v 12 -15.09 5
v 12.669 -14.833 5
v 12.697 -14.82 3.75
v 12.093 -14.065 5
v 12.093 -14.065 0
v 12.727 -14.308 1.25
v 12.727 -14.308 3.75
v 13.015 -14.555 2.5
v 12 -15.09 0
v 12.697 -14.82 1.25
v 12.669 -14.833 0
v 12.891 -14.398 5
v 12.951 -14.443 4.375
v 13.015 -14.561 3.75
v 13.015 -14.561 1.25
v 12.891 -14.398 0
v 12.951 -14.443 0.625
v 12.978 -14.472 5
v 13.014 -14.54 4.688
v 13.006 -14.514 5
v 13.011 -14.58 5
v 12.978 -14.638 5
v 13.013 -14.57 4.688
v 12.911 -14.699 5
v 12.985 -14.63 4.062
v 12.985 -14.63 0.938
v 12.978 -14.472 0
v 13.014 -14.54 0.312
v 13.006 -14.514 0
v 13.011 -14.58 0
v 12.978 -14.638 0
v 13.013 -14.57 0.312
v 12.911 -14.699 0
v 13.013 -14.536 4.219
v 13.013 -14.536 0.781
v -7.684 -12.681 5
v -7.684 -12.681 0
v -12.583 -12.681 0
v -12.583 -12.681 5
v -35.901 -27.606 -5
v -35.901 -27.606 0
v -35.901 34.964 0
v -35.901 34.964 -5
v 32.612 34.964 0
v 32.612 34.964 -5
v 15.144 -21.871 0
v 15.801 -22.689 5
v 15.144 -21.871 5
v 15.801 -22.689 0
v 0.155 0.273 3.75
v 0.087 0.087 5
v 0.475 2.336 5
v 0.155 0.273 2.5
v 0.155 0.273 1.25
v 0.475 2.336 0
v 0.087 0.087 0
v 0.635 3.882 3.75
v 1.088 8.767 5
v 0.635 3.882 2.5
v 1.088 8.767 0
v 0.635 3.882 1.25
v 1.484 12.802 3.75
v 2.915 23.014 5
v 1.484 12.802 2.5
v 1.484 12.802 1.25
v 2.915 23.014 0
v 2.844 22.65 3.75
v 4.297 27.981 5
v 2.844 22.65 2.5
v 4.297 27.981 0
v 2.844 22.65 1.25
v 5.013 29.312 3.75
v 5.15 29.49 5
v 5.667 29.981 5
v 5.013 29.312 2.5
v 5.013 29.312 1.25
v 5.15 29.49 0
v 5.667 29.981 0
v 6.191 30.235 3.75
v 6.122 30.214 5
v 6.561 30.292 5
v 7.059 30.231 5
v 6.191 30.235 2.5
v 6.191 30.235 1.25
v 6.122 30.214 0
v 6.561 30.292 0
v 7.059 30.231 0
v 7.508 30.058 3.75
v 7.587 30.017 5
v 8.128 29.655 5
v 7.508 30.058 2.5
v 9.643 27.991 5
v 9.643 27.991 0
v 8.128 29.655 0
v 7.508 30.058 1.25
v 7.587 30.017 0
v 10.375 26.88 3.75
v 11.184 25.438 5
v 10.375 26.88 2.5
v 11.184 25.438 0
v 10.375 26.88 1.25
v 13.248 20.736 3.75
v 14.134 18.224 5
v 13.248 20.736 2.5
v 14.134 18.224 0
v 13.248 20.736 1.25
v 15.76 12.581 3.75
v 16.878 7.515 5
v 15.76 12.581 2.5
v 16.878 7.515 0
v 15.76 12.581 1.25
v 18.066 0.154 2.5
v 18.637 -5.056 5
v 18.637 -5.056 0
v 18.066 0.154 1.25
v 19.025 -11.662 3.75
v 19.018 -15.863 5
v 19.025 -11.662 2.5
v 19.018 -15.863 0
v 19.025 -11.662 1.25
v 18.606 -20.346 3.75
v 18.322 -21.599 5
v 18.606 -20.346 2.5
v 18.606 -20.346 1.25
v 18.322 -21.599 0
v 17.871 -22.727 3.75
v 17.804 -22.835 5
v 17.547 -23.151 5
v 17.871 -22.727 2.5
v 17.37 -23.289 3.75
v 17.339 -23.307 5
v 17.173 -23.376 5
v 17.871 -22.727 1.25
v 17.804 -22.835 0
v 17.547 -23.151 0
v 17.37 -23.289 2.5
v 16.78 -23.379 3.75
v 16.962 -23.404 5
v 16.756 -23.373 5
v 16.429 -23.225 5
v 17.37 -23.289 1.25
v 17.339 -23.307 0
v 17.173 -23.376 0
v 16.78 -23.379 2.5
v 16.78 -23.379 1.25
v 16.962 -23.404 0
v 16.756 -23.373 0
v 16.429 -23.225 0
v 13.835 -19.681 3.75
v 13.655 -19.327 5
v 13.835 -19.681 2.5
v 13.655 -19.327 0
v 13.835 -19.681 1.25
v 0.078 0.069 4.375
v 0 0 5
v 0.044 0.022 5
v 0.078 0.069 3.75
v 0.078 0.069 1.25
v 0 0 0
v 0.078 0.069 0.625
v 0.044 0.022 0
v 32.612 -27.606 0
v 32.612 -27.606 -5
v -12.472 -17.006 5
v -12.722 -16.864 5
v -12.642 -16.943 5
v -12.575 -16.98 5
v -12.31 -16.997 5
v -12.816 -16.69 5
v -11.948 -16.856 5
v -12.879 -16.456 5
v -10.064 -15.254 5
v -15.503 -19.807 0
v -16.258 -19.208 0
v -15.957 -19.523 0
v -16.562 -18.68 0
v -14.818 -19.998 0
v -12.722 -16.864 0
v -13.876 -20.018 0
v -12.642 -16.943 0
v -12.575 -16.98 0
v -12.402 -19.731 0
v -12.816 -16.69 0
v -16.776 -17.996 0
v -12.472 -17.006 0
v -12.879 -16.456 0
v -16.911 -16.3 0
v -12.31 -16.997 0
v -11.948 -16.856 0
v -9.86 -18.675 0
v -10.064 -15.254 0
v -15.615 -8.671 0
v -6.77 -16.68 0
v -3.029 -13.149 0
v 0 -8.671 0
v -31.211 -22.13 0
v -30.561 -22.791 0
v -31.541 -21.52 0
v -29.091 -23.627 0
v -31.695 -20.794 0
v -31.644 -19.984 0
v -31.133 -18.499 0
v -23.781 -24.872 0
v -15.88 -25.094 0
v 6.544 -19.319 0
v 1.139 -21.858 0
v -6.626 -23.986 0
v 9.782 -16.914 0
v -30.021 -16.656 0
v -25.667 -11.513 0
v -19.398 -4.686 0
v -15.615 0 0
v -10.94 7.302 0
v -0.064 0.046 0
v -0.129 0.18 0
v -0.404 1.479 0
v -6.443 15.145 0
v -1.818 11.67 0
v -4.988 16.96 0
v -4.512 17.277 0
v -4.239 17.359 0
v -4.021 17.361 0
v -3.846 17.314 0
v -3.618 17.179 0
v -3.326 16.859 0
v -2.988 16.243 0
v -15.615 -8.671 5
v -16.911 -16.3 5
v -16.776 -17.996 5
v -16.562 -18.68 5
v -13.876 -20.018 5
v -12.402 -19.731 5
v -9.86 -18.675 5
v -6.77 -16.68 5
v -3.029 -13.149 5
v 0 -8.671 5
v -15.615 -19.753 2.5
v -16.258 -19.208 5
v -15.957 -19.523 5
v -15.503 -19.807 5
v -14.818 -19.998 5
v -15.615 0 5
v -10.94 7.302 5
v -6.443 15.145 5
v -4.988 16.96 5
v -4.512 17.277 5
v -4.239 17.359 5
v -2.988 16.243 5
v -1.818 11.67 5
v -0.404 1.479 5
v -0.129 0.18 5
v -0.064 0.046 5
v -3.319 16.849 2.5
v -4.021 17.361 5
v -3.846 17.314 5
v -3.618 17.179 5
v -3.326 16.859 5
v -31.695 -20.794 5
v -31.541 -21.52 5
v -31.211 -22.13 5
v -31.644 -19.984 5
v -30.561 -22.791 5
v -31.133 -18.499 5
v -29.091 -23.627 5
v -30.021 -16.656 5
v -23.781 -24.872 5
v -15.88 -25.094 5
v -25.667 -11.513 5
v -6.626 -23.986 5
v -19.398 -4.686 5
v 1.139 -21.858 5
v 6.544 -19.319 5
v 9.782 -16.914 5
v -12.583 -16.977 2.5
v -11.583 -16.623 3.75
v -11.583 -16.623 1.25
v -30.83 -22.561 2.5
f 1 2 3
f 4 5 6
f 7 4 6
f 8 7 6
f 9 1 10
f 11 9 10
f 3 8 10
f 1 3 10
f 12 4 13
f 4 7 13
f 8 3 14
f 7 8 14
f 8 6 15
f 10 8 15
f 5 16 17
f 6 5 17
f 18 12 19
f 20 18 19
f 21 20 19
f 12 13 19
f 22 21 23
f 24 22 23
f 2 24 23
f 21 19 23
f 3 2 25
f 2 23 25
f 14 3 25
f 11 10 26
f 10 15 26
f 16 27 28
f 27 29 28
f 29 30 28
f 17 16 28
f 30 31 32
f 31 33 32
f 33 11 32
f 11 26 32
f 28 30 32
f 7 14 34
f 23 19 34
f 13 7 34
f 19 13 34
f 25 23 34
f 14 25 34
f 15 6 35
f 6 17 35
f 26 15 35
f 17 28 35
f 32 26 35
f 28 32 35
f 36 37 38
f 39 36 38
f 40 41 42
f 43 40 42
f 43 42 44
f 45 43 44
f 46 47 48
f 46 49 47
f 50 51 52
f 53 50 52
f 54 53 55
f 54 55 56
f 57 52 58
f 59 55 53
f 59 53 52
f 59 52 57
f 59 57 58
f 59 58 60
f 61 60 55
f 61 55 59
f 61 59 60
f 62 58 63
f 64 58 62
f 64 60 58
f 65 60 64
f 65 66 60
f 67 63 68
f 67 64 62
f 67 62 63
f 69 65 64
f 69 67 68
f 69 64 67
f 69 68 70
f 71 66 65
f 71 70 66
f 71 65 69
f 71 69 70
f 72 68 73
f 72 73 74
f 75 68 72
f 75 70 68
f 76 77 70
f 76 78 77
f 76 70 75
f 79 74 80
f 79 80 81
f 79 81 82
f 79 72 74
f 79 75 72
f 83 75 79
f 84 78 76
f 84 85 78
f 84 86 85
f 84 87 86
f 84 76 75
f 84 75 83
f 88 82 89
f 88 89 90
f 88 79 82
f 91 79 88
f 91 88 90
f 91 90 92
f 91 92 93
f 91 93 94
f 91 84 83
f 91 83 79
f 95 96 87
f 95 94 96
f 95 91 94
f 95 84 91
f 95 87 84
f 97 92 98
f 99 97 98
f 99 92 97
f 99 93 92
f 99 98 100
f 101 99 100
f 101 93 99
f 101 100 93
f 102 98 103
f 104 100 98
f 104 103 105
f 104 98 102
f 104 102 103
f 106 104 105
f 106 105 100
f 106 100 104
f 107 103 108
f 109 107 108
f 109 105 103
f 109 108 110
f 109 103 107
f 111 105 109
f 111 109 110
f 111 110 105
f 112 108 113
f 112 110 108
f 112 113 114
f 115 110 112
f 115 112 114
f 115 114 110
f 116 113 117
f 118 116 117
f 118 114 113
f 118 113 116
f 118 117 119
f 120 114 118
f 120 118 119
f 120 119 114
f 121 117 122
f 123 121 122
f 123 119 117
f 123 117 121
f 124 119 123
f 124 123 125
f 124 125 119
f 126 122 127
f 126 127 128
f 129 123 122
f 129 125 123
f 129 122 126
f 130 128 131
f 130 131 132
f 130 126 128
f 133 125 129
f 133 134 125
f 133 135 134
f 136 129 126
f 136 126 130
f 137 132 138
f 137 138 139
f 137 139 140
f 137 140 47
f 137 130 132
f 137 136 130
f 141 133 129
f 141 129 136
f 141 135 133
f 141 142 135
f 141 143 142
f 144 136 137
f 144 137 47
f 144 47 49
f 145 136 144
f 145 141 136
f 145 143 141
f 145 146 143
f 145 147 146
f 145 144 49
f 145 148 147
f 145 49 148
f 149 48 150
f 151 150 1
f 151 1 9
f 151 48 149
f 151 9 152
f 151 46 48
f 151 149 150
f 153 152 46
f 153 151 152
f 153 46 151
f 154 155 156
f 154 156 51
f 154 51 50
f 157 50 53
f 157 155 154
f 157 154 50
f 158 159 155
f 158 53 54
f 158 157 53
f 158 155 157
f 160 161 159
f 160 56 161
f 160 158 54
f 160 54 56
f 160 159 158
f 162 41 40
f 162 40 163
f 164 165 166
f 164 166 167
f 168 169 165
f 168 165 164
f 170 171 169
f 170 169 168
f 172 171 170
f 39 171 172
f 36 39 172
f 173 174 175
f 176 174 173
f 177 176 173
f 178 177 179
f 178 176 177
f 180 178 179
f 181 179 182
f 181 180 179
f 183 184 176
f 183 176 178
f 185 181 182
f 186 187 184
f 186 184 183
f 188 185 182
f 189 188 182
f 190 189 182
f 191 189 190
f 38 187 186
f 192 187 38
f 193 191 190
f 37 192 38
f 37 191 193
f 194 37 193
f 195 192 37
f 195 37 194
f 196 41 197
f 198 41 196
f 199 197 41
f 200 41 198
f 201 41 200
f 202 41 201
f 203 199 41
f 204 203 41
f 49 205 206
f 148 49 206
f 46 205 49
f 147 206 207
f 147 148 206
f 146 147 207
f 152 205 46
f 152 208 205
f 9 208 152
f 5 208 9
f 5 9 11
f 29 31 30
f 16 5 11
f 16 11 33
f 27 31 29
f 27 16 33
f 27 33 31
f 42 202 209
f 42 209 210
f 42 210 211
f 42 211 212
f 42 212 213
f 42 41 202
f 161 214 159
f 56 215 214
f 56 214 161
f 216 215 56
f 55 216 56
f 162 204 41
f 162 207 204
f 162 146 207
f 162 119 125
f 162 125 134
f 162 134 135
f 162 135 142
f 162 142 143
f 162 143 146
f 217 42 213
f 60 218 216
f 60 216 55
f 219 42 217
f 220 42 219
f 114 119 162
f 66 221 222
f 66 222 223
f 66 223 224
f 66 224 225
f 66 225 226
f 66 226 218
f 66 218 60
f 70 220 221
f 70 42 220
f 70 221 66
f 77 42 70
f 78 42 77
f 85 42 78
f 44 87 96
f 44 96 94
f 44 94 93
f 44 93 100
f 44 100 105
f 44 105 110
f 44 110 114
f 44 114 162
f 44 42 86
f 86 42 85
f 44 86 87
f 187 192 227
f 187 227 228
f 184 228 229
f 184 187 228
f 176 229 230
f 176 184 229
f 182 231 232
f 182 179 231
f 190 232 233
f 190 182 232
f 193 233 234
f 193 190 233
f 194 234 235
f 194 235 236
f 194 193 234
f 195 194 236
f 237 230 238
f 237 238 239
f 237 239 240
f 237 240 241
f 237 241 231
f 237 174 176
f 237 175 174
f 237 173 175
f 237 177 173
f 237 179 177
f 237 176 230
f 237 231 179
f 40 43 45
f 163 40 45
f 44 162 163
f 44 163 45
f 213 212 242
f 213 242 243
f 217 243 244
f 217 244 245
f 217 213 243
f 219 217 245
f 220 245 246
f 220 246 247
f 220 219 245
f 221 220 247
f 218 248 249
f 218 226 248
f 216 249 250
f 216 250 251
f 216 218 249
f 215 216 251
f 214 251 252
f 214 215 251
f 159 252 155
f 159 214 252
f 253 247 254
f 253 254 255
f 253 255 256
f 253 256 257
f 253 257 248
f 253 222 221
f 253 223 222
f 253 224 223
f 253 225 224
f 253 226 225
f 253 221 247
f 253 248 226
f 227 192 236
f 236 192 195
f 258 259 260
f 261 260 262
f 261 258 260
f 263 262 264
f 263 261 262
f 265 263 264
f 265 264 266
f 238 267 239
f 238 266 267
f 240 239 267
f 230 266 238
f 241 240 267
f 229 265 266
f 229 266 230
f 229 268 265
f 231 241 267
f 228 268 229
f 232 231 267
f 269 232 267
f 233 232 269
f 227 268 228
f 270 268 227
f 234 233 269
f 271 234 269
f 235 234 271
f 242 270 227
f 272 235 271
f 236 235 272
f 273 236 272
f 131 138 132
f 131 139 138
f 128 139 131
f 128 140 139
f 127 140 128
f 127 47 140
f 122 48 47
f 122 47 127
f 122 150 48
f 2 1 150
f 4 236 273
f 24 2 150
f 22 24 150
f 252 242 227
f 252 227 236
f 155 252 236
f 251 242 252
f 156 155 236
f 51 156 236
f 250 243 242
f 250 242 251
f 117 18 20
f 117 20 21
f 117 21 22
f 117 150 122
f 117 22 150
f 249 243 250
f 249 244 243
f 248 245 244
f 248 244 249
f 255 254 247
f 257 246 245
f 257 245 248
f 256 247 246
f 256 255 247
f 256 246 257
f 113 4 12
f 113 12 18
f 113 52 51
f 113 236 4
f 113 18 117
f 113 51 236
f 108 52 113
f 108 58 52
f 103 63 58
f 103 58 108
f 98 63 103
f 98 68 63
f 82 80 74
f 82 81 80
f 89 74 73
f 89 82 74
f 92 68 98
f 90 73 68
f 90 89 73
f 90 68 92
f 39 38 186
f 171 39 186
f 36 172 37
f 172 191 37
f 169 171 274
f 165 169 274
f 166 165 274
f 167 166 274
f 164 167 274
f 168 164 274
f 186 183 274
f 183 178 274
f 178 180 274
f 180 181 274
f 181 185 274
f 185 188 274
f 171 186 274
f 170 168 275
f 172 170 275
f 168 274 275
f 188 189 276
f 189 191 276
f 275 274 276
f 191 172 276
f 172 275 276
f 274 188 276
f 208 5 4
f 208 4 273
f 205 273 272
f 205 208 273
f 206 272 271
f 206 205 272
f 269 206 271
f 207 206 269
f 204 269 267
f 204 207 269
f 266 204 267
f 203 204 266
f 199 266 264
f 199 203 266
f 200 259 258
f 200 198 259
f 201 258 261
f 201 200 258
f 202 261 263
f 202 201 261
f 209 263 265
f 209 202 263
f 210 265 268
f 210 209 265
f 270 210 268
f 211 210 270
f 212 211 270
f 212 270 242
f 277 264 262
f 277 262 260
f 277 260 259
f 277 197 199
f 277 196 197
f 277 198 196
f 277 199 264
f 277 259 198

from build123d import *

# Parameters (mm, degrees)
F0_W     = 15.6148327515
F0_H     = 8.6711440235
F1_DEPTH = 5
F3_DEPTH = 5
F4_W     = 68.5134455562
F4_H     = 62.5702701509
F5_DEPTH = 5


with BuildPart() as f1:
    # F0 (on Top) → F1 (new body)
    with BuildSketch(Plane.XY):
        with BuildLine():
            Line((-15.6148327515, 0), (0, 0))
            add(Edge.make_bspline(
                [(-15.6148327515, 0), (-8.9372500336, 9.1029204064), (-2.2477140541, 29.6426476673), (-0.6363883786, 0.0078806838), (0, 0)],
                knots=[0.5007531788, 0.5007531788, 0.5007531788, 0.5007531788, 0.5806839228, 0.6532089623, 0.6532089623, 0.6532089623, 0.6532089623], degree=3))
        make_face()
        with BuildLine():
            Line((-15.6148327515, -8.6711440235), (-15.6148327515, 0))
            add(Edge.make_bspline(
                [(12.0928417891, -14.0651799738), (5.386580395, -25.6612903483), (-49.9212476219, -29.049867362), (-23.2419077071, -10.3972738622), (-15.6148327515, 0)],
                knots=[0.2936885694, 0.2936885694, 0.2936885694, 0.2936885694, 0.4094570015, 0.5007531788, 0.5007531788, 0.5007531788, 0.5007531788], degree=3))
            add(Edge.make_bspline(
                [(0, -8.6711440235), (3.7584985414, -1.2441509088), (1.9211653663, 20.0410270227), (16.9917902231, -5.5941790062), (12.0928417891, -14.0651799738)],
                knots=[0.1348423555, 0.1348423555, 0.1348423555, 0.1348423555, 0.2091193071, 0.2936885694, 0.2936885694, 0.2936885694, 0.2936885694], degree=3))
            add(Edge.make_bspline(
                [(-15.6148327515, -8.6711440235), (-16.7391498892, -13.622858393), (-19.3413703684, -25.0835499715), (-3.8751508711, -16.3286483489), (0, -8.6711440235)],
                knots=[0, 0, 0, 0, 0.0582600739, 0.1348423555, 0.1348423555, 0.1348423555, 0.1348423555], degree=3))
        make_face()
        with BuildLine():
            add(Edge.make_bspline(
                [(0, 0), (0.837458348, -0.0103706237), (1.9500780727, 44.3228880047), (19.3895903674, 12.2973607043), (20.3959204885, -35.025724631), (12.2675216154, -16.7139183871), (11.9997626171, -15.0897074491)],
                knots=[0.6532089623, 0.6532089623, 0.6532089623, 0.6532089623, 0.7486486369, 0.8266926063, 0.9316650104, 0.985804196, 0.985804196, 0.985804196, 0.985804196], degree=3))
            Line((0, 0), (0, -8.6711440235))
            add(Edge.make_bspline(
                [(0, -8.6711440235), (3.7584985414, -1.2441509088), (1.9211653663, 20.0410270227), (16.9917902231, -5.5941790062), (12.0928417891, -14.0651799738)],
                knots=[0.1348423555, 0.1348423555, 0.1348423555, 0.1348423555, 0.2091193071, 0.2936885694, 0.2936885694, 0.2936885694, 0.2936885694], degree=3))
            add(Edge.make_bspline(
                [(12.0928417891, -14.0651799738), (12.5539589764, -14.2266429433), (13.4985312959, -14.5573913273), (12.5071668502, -14.9094929242), (11.9997626171, -15.0897074491)],
                knots=[0, 0, 0, 0, 0.4881756567, 1, 1, 1, 1], degree=3))
        make_face()
        with Locations((-7.8074163757, -4.3355720118)):
            Rectangle(F0_W, F0_H)
    extrude(amount=F1_DEPTH)



with BuildPart() as f3:
    # F2 (on Top) → F3 (new body)
    with BuildSketch(Plane.XY):
        with BuildLine():
            add(Edge.make_bspline(
                [(-12.5829353929, -12.6812420785), (-12.8800111884, -14.6944980362), (-13.5429496039, -19.1871719349), (-9.7677541735, -14.9948836926), (-7.6842978597, -12.6812420785)],
                knots=[0, 0, 0, 0, 0.4481197185, 1, 1, 1, 1], degree=3))
            Line((-7.6842978597, -12.6812420785), (-12.5829353929, -12.6812420785))
        make_face()
    extrude(amount=F3_DEPTH)


with BuildPart() as f1_1:
    add(f1.part)

    add(f3.part)  # F5 merges F3
    # F4 (on Top) → F5 (join)
    with BuildSketch(Plane.XY):
        with Locations((-1.6445852816, 3.6791656166)):
            Rectangle(F4_W, F4_H)
    extrude(amount=-F5_DEPTH)


solid = f1_1.part
